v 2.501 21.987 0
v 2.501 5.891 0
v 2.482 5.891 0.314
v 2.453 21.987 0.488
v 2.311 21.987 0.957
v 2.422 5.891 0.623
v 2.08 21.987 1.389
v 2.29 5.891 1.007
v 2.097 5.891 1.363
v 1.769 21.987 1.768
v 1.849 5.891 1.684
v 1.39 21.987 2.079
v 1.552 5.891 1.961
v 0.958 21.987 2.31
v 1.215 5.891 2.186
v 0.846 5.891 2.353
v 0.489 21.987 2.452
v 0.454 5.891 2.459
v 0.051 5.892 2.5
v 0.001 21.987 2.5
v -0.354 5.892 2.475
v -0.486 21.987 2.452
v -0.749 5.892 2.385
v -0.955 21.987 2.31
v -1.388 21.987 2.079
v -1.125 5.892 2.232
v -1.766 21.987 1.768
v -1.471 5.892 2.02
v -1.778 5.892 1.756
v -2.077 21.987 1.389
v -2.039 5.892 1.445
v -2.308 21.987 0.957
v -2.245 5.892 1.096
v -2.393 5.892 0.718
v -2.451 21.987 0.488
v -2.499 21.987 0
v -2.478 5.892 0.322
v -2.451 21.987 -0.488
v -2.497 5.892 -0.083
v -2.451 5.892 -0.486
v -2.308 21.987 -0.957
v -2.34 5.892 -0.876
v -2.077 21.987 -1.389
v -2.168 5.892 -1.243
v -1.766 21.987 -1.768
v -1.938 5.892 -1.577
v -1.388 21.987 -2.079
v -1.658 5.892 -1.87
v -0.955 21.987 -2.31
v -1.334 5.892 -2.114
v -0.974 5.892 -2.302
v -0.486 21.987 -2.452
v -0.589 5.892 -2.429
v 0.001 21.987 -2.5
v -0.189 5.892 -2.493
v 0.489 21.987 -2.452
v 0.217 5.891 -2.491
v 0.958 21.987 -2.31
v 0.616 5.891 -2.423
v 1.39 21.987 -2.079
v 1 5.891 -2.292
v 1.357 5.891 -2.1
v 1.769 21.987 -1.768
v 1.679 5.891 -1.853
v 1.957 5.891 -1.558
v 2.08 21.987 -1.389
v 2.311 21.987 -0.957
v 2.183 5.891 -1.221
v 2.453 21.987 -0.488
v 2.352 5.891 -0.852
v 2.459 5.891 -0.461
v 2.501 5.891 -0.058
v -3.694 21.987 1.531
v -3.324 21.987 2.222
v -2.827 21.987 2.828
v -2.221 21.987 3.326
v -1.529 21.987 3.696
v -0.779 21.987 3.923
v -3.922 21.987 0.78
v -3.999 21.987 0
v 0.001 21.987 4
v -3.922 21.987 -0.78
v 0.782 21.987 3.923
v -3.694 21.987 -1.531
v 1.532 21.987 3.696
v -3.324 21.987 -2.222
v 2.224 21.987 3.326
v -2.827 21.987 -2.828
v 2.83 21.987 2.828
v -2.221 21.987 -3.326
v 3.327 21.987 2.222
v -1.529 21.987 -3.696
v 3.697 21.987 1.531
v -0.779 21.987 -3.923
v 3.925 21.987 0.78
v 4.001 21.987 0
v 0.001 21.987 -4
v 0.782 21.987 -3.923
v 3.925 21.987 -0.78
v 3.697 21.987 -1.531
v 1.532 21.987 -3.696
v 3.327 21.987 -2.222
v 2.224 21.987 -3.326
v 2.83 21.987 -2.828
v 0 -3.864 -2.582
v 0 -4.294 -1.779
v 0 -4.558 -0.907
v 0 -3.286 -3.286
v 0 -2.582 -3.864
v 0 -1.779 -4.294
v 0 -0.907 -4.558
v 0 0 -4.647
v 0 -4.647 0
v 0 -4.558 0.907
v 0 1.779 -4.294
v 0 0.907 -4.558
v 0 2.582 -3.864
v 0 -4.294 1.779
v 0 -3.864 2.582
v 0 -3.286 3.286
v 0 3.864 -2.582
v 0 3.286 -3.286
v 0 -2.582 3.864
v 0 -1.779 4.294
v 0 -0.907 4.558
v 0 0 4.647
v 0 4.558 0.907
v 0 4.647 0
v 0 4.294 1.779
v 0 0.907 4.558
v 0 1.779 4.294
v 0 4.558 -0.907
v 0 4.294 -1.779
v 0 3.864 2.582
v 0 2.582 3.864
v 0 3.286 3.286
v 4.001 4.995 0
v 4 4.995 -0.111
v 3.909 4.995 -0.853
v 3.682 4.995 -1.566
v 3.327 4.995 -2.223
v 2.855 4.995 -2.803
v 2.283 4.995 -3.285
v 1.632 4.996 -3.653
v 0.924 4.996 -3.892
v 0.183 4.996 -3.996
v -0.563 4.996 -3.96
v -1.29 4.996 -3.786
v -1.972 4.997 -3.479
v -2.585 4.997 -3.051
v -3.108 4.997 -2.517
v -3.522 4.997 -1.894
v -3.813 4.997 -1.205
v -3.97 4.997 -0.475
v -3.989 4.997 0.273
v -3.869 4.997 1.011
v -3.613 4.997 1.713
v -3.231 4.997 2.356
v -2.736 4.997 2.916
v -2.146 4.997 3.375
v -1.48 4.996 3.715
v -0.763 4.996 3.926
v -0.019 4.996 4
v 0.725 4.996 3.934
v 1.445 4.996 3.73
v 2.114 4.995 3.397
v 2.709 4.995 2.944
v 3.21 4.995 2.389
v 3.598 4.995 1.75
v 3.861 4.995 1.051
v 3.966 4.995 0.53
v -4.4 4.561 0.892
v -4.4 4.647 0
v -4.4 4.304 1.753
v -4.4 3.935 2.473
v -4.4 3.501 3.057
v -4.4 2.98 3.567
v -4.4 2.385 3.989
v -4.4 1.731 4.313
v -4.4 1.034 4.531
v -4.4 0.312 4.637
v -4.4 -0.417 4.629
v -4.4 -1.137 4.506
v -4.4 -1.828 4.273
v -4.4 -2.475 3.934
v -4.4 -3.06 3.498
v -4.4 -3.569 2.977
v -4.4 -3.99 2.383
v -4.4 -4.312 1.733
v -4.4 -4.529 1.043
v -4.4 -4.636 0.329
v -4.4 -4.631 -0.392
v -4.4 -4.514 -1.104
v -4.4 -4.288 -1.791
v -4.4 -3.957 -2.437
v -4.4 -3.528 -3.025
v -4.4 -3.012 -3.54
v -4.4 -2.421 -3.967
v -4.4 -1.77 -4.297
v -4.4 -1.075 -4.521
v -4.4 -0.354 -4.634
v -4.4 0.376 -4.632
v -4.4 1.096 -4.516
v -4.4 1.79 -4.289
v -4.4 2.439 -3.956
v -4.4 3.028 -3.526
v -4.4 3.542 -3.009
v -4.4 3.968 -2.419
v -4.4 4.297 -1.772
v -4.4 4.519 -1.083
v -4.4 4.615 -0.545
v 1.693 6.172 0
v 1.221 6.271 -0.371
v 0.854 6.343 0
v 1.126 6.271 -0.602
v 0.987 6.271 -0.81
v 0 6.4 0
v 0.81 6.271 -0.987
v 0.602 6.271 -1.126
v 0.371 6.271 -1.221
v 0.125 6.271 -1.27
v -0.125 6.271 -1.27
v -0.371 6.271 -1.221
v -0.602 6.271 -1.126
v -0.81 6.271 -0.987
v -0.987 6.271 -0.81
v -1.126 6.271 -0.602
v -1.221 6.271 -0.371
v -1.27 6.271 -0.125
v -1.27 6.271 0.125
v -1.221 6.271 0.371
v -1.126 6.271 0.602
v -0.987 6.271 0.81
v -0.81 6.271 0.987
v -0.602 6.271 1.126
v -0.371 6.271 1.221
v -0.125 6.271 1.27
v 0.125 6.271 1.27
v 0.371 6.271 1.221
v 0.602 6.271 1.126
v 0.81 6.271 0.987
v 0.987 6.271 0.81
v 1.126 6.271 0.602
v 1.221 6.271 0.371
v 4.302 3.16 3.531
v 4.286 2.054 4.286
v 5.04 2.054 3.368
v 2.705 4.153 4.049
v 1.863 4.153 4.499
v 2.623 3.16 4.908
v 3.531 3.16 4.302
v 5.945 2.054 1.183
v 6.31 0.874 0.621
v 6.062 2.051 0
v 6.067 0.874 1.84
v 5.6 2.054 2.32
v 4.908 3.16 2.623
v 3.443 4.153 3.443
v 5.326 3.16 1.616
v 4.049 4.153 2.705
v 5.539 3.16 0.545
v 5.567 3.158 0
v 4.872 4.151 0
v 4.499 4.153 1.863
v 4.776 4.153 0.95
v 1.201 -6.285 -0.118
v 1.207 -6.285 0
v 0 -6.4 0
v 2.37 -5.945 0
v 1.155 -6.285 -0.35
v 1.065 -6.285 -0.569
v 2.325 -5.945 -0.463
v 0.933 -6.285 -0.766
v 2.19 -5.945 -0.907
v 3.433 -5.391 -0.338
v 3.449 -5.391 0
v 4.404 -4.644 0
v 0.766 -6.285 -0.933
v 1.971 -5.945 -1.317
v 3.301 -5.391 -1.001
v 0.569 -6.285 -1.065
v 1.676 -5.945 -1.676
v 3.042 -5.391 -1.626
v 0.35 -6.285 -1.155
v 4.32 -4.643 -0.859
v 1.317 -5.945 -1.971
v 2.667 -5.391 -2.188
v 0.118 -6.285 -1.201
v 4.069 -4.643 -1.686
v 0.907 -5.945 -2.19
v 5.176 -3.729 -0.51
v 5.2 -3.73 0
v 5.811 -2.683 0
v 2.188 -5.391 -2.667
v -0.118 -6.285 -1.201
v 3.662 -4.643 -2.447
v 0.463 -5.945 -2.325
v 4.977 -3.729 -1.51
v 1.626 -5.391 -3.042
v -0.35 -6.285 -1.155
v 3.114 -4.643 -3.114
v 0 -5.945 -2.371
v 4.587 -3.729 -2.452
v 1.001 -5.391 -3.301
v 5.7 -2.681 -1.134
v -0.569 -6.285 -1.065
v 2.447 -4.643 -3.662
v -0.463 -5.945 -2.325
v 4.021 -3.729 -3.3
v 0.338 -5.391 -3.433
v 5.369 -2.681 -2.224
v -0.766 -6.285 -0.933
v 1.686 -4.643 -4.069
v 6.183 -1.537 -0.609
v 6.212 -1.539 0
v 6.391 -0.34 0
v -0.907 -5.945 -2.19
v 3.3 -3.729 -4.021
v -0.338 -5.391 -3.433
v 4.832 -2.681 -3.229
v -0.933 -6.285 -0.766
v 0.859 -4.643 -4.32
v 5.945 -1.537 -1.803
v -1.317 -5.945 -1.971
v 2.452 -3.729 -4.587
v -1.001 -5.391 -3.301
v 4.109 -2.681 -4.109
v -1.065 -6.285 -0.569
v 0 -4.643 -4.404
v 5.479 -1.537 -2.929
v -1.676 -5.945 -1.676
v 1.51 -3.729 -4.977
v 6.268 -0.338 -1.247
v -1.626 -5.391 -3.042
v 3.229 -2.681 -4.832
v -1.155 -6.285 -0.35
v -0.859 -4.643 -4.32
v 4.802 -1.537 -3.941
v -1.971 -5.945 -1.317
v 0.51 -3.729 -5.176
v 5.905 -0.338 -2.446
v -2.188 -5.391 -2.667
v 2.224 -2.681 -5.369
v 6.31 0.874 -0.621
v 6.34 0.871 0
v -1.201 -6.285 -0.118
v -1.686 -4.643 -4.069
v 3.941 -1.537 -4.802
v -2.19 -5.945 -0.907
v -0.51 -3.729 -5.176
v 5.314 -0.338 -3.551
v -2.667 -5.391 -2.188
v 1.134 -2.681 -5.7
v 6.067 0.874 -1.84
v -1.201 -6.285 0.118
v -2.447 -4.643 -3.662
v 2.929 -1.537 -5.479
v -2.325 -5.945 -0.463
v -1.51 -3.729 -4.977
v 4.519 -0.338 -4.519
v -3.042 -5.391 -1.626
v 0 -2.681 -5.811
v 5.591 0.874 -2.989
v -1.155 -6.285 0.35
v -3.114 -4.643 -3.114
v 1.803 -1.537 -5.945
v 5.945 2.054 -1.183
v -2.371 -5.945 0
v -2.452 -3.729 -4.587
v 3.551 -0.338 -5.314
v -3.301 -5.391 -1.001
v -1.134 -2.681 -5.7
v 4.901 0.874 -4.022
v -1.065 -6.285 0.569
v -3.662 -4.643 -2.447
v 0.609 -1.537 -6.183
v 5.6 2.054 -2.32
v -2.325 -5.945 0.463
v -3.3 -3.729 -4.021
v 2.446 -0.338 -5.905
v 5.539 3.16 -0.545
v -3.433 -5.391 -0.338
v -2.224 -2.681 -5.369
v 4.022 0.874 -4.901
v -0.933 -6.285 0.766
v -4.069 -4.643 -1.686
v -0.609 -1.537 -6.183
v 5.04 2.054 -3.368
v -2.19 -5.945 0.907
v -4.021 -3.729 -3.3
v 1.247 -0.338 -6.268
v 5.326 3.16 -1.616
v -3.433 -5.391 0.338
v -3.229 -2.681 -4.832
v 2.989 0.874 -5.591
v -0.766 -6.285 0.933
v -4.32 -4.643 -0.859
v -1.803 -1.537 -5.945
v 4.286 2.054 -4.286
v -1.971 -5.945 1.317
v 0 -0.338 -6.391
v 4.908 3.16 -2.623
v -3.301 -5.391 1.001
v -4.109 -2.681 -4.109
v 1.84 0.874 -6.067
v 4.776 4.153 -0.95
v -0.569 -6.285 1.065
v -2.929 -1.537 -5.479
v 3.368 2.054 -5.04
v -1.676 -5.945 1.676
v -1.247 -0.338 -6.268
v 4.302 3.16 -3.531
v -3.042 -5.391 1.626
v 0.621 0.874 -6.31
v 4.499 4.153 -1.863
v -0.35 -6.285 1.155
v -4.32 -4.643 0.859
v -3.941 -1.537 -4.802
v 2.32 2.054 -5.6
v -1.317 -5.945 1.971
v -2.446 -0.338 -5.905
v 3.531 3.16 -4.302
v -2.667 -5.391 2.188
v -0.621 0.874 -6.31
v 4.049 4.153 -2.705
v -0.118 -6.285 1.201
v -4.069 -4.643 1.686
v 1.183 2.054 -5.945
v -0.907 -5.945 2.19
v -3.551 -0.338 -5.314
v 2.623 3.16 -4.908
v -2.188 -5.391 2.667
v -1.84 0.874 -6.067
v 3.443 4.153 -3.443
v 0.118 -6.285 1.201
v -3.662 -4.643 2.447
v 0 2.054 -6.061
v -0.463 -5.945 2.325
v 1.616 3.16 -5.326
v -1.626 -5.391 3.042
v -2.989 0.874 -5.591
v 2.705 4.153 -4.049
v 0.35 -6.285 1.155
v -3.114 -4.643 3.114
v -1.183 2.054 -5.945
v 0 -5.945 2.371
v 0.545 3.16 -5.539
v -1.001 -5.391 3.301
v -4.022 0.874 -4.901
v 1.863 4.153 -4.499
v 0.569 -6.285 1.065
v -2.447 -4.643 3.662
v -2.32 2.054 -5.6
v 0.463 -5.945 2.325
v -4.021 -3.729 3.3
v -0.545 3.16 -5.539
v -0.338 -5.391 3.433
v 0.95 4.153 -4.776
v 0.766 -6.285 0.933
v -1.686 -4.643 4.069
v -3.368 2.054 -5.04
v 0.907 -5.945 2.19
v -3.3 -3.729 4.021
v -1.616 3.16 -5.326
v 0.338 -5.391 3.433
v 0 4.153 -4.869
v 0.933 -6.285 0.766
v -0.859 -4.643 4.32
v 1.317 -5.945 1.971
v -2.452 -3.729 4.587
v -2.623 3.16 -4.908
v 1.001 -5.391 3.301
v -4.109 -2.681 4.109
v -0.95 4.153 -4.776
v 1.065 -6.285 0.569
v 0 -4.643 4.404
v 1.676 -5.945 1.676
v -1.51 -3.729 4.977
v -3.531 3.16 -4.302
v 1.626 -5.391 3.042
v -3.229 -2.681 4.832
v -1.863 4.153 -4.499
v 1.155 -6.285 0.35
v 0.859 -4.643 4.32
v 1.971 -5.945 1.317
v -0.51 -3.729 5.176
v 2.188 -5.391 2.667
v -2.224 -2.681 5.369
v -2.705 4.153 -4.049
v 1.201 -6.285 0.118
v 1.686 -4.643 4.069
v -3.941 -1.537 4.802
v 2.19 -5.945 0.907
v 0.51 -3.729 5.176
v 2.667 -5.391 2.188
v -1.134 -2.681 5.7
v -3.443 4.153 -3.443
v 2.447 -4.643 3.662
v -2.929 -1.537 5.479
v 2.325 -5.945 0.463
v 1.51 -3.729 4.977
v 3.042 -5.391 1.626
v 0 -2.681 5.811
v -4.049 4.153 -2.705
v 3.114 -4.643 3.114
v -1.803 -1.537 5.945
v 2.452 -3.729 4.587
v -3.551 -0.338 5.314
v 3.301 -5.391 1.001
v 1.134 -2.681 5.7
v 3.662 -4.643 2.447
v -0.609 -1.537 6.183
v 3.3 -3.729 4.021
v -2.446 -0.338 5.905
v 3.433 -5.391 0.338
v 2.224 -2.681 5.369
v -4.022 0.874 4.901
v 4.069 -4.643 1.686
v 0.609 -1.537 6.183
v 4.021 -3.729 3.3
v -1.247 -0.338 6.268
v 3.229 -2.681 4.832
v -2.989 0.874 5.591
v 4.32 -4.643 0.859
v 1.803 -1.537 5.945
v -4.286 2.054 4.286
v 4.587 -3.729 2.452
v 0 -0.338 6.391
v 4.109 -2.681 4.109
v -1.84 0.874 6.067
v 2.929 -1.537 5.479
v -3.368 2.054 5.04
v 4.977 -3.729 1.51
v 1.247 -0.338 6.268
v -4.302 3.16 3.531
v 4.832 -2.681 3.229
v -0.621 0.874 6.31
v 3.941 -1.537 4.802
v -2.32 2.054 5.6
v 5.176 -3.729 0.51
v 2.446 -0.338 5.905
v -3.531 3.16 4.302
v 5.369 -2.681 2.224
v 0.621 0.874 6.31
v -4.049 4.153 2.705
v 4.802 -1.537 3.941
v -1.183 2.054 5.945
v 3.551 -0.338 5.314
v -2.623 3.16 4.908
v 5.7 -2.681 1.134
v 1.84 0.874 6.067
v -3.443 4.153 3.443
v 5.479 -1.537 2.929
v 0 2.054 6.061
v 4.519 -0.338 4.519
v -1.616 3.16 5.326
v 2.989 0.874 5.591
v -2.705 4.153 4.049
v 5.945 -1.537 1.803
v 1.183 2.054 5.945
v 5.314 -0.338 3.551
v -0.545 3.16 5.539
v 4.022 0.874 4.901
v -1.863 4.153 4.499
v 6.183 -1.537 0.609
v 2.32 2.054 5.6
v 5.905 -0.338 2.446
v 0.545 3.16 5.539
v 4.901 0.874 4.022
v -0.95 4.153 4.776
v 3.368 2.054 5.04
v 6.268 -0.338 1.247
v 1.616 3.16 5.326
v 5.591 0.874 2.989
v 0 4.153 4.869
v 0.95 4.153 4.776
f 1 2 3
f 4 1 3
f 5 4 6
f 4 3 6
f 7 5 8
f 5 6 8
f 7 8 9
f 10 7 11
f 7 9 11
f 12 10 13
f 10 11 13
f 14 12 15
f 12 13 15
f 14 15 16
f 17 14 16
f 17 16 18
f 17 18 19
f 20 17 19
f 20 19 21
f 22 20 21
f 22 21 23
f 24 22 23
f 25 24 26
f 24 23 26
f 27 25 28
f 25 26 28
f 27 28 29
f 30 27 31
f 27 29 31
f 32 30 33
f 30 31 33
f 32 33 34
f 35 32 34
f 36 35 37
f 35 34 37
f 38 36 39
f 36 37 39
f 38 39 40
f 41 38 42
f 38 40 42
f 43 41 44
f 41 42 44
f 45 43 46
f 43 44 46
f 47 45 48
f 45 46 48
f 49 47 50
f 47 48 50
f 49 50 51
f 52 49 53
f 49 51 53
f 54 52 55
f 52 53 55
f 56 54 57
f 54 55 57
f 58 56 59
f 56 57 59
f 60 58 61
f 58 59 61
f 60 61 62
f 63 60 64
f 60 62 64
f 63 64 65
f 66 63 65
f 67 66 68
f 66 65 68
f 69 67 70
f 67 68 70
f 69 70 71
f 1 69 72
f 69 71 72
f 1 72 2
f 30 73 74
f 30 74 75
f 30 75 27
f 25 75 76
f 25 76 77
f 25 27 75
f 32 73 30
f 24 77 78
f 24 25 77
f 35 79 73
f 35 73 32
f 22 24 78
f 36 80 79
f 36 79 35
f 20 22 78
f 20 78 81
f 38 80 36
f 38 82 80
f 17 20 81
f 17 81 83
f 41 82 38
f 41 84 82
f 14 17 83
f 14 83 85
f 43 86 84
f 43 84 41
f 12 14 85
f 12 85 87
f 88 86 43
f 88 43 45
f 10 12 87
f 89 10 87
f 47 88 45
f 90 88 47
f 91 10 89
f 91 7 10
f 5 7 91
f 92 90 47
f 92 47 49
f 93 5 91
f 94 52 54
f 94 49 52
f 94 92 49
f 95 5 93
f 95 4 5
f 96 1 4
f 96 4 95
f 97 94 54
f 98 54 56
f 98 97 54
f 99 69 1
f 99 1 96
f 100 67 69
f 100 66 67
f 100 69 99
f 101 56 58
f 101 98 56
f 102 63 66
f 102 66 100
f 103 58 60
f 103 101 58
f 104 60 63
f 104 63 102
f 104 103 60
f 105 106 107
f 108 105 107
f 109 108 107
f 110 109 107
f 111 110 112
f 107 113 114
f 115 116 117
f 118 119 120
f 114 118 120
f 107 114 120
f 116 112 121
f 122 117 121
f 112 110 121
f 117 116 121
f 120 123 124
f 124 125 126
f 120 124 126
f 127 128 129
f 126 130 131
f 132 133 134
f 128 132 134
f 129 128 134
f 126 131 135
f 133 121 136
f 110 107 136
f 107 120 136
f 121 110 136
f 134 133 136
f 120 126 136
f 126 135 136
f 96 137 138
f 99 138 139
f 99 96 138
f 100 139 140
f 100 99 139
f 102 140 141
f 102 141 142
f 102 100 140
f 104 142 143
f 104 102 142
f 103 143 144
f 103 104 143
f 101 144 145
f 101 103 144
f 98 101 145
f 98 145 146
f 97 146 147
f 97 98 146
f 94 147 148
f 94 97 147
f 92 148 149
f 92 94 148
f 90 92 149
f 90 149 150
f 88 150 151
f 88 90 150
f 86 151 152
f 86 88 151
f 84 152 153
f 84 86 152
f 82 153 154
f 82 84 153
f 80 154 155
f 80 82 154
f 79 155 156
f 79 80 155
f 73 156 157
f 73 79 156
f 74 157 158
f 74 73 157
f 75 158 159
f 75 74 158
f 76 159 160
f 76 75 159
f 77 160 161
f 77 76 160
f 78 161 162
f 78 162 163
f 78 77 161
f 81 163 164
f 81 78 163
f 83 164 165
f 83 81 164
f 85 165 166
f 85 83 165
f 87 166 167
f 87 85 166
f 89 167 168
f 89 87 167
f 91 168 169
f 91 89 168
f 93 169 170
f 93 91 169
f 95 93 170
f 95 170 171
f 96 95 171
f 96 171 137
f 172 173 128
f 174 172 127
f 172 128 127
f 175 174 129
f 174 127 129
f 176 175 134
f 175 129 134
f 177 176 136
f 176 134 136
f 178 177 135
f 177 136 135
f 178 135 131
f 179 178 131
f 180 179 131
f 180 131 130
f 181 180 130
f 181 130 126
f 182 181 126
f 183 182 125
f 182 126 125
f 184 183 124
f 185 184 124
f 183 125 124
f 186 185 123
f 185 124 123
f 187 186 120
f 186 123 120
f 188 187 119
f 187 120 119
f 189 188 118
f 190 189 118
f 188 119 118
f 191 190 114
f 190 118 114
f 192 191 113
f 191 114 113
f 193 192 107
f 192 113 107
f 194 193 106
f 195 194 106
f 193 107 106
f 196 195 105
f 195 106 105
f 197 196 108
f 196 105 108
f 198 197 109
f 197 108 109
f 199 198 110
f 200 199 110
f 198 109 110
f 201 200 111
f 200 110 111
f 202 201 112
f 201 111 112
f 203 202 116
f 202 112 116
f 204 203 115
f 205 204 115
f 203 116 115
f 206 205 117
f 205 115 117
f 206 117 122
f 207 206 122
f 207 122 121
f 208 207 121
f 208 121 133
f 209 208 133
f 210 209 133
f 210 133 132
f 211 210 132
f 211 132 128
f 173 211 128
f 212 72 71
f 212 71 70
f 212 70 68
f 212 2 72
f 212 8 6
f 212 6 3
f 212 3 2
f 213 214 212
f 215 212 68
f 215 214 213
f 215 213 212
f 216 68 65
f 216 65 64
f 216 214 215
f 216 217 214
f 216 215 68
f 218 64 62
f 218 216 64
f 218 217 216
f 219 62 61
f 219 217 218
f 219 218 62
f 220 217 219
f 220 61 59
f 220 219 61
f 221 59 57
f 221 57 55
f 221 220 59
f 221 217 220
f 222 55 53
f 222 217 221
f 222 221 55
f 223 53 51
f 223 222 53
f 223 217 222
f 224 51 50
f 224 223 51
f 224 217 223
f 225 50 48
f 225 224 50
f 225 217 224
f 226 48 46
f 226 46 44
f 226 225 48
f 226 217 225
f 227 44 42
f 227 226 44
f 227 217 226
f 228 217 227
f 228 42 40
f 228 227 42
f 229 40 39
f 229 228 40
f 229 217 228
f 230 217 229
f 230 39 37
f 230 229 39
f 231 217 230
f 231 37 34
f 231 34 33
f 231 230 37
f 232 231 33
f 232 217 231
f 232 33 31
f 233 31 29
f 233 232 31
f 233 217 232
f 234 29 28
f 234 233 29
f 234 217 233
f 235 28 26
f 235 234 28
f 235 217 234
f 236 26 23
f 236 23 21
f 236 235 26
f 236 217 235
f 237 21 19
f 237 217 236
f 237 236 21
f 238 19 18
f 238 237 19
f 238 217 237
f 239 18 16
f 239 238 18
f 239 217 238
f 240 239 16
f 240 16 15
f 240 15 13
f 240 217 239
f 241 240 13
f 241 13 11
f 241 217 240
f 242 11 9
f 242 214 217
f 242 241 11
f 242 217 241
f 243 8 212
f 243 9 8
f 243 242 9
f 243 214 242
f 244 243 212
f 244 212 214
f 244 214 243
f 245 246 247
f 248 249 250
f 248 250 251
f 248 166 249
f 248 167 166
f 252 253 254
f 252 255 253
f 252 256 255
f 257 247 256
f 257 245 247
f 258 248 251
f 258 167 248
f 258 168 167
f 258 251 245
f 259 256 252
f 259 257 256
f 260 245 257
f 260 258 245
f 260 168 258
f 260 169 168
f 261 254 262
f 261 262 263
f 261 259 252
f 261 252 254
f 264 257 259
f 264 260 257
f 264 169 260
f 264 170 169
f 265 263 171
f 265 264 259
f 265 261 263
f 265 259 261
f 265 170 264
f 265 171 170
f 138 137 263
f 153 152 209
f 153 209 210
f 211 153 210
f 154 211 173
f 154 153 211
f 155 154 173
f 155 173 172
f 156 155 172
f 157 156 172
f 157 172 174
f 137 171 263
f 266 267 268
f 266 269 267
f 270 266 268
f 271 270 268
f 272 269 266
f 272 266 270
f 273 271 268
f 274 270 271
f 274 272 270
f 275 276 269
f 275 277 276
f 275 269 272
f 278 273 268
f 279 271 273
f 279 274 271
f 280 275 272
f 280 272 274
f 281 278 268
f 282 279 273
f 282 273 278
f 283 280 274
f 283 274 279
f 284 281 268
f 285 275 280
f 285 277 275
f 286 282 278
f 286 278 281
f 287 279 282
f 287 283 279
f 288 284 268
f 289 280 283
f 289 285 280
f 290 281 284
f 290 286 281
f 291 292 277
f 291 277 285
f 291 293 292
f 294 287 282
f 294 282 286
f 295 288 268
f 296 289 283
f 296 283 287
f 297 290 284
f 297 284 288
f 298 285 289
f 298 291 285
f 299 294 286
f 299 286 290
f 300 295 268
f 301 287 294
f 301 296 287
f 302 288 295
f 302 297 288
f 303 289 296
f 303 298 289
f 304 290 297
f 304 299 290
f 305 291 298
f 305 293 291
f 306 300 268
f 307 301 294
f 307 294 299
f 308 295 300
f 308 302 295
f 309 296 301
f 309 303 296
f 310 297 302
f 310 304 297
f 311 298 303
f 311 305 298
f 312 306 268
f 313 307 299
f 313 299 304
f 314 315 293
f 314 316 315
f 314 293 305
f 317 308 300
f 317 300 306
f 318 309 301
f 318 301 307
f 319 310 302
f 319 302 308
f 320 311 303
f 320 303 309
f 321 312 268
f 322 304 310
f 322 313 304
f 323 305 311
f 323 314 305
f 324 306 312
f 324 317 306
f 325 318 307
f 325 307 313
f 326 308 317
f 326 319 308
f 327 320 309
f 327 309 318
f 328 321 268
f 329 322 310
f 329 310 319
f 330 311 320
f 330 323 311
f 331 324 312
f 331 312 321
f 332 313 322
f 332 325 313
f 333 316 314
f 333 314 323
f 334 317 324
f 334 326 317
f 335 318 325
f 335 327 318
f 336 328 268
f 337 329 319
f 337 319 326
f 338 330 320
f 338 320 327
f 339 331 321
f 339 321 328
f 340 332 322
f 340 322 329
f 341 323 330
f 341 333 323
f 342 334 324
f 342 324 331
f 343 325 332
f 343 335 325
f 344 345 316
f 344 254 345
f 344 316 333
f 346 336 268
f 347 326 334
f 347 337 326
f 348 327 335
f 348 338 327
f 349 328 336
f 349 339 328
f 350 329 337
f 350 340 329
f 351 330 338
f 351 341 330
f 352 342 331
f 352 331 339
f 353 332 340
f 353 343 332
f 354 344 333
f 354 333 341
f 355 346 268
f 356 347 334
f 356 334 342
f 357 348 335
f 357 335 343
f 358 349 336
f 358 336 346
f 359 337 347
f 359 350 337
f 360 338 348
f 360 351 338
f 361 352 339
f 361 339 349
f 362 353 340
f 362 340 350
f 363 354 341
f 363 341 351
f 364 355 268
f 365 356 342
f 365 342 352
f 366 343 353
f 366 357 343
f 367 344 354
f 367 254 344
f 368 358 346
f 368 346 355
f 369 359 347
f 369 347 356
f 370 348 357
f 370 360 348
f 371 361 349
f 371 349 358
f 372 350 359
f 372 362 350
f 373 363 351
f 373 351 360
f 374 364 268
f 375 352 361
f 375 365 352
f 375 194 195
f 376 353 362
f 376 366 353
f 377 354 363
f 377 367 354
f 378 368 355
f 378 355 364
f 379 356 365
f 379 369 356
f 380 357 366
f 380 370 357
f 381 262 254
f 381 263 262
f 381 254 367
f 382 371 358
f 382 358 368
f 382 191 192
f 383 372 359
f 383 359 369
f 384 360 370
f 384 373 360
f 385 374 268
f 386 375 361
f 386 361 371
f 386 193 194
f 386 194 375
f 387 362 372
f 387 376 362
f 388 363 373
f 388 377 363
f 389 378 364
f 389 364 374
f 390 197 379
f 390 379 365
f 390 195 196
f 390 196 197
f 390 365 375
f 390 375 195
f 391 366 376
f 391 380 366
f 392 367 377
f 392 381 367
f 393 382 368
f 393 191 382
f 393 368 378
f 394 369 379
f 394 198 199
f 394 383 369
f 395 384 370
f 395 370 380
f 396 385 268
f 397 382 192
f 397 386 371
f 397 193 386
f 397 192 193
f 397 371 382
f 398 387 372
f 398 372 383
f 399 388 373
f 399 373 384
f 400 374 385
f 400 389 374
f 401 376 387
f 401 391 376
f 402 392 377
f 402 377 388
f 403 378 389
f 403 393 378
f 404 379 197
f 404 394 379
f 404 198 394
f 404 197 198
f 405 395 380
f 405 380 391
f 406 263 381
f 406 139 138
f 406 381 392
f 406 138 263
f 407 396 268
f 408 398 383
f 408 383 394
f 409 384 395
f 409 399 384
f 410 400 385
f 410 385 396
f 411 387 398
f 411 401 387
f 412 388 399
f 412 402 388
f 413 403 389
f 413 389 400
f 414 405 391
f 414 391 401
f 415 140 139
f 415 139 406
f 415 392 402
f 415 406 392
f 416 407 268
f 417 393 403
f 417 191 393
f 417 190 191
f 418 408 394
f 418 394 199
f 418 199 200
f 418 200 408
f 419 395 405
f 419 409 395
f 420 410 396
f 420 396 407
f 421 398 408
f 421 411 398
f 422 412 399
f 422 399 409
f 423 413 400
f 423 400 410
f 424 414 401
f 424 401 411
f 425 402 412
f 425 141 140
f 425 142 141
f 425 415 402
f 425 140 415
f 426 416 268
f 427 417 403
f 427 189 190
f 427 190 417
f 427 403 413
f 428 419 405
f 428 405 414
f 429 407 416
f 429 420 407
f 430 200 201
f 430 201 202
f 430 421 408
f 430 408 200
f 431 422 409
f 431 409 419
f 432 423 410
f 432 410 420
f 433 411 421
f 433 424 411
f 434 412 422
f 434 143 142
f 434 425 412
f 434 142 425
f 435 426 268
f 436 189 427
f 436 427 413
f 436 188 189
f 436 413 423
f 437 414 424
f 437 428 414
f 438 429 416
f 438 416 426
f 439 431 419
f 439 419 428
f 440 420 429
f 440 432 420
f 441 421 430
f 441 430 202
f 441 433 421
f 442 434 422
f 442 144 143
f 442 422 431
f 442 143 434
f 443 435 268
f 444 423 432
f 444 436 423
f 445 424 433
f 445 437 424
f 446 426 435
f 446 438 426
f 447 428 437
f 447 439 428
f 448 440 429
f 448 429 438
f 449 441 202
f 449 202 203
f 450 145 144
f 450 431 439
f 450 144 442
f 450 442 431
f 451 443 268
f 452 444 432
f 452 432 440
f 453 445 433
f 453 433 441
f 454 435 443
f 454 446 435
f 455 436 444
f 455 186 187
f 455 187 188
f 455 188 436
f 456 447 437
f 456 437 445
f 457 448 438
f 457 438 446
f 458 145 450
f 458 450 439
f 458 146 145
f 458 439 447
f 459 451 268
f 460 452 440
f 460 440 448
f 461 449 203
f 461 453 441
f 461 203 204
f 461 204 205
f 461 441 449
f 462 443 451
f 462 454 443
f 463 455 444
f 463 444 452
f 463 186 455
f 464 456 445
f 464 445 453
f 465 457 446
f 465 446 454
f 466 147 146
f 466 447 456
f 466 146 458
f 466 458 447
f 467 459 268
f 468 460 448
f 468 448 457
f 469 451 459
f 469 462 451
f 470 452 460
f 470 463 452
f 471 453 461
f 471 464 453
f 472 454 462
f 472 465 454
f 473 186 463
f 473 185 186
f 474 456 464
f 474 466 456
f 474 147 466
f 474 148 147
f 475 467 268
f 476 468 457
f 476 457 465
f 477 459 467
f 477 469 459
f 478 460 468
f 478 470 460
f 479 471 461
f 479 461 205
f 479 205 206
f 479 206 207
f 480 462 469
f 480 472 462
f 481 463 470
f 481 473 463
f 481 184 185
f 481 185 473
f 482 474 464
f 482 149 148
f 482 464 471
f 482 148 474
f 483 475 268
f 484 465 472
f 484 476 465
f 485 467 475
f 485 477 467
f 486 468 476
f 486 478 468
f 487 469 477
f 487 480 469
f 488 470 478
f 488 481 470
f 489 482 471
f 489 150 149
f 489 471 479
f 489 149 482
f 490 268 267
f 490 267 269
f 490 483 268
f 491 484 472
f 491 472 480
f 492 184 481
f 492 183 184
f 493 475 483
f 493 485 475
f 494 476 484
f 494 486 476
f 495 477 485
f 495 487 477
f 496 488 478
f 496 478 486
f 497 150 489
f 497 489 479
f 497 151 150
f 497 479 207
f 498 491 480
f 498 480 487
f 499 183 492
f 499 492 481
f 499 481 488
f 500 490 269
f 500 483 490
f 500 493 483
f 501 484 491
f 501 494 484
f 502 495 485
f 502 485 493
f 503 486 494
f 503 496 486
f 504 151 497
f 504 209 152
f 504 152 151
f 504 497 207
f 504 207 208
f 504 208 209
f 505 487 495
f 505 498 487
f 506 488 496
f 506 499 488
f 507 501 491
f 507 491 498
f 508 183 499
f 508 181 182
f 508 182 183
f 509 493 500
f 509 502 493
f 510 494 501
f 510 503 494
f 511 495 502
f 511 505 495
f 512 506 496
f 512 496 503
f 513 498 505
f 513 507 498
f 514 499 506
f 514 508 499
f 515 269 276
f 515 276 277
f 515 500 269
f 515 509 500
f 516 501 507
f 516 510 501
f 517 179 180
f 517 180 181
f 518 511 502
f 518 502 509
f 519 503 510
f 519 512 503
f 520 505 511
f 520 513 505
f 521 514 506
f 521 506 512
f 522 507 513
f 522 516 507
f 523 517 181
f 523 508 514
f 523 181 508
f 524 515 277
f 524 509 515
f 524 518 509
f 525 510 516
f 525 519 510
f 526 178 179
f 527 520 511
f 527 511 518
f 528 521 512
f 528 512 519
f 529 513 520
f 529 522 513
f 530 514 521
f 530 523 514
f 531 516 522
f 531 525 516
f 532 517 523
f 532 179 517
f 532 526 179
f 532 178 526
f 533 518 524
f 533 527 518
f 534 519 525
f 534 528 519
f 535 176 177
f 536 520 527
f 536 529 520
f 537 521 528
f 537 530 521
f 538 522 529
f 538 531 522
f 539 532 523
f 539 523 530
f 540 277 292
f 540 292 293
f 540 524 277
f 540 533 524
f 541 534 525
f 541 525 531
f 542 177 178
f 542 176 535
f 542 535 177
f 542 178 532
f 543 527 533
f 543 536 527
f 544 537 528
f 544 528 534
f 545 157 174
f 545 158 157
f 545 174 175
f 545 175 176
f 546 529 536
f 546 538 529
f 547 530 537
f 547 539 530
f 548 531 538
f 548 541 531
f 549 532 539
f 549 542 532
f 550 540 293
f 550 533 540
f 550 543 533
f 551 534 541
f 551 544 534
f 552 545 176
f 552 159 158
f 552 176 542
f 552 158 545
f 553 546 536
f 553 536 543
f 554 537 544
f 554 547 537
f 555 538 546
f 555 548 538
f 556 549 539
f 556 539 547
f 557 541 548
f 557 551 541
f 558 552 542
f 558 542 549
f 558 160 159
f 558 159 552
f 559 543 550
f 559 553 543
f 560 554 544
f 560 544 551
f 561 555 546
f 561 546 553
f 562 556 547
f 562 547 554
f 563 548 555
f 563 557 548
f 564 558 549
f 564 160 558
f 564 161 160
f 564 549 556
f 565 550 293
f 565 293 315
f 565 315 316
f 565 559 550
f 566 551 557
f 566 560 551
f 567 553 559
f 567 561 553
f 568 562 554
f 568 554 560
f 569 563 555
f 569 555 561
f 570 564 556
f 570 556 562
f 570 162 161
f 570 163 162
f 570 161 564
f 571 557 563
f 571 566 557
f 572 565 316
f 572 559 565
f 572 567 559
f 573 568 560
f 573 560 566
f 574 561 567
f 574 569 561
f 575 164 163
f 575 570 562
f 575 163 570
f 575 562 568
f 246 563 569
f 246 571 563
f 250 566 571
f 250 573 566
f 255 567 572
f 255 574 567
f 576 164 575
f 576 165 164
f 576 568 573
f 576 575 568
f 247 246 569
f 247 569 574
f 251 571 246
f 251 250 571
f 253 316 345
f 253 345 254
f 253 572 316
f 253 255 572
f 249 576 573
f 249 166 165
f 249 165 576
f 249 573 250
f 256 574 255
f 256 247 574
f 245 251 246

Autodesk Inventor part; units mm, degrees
ref_plane "YZ Plane" through (0, 0, 0) normal (1, 0, 0) x (0, 1, 0)
ref_plane "XZ Plane" through (0, 0, 0) normal (0, 1, 0) x (-1, 0, 0)
ref_plane "XY Plane" through (0, 0, 0) normal (0, 0, 1) x (1, 0, 0)
sketch "스케치1" plane through (0, 0, 0) normal (0, 0, 1) x (1, 0, 0)
  circle A0 centre (0, 0) radius 6.4
  line L0 (0, 6.4) -> (0, -6.4)
  dimension "d0" = 12.8
sketch "스케치1 outline for SR sphere" plane through (0, 0, 0) normal (0, 0, 1) x (1, 0, 0)
  line L0 (0, 6.4) -> (0, -6.4)
  arc A0 (0, -6.4) -> (0, 6.4) centre (0, 0) ccw
revolve "SR sphere" add sketch "스케치1 outline for SR sphere" angle 360 about axis through (0, 6.4, 0) along (0, -1, 0)
sketch "e" plane through (0, 0, 0) normal (1, 0, 0) x (0, 1, 0)
  circle A0 centre (0, 0) radius 4.647459
sketch "e outline for e hole" plane through (0, 0, 0) normal (1, 0, 0) x (0, 1, 0)
  circle A0 centre (0, 0) radius 4.647459
extrude "e hole" cut sketch "e outline for e hole" against normal blind 6.4
sketch "스케치6" plane through (0, 0, 0) normal (0, 0, 1) x (1, 0, 0)
  arc A0 (-4.400128, -4.647459) -> (-4.400128, 4.647459) centre (0, 0) ccw
  line L0 (4.001417, 4.994864) -> (4.001417, 21.987002)
  line L1 (4.001417, 21.987002) -> (2.501417, 21.987002)
  line L2 (2.501417, 21.987002) -> (2.501417, 5.890918)
  line L3 (0.001417, -6.4) -> (0.001417, 19.355985)
  line L4 (10.301781, -0.012998) -> (-6.695287, -0.012998)
  line L5 (4.001417, 4.994864) -> (2.501417, 5.890918)
  point P0 (3.251417, 21.987002)
  dimension "d4" = 1.5
  dimension "d5" = 4
  dimension "d6" = 22
sketch "스케치6 outline for h, g 고려 회전" plane through (0, 0, 0) normal (0, 0, 1) x (1, 0, 0)
  line L0 (4.001417, 21.987002) -> (2.501417, 21.987002)
  line L1 (4.001417, 4.994864) -> (4.001417, 21.987002)
  arc A0 (2.501417, 5.890918) -> (4.001417, 4.994864) centre (0, 0) cw
  line L2 (2.501417, 21.987002) -> (2.501417, 5.890918)
revolve "h, g 고려 회전" add sketch "스케치6 outline for h, g 고려 회전" angle 360 about axis through (0.001417, -6.4, 0) along (0, 1, 0)
properties part number "Ball Joint_bot"
